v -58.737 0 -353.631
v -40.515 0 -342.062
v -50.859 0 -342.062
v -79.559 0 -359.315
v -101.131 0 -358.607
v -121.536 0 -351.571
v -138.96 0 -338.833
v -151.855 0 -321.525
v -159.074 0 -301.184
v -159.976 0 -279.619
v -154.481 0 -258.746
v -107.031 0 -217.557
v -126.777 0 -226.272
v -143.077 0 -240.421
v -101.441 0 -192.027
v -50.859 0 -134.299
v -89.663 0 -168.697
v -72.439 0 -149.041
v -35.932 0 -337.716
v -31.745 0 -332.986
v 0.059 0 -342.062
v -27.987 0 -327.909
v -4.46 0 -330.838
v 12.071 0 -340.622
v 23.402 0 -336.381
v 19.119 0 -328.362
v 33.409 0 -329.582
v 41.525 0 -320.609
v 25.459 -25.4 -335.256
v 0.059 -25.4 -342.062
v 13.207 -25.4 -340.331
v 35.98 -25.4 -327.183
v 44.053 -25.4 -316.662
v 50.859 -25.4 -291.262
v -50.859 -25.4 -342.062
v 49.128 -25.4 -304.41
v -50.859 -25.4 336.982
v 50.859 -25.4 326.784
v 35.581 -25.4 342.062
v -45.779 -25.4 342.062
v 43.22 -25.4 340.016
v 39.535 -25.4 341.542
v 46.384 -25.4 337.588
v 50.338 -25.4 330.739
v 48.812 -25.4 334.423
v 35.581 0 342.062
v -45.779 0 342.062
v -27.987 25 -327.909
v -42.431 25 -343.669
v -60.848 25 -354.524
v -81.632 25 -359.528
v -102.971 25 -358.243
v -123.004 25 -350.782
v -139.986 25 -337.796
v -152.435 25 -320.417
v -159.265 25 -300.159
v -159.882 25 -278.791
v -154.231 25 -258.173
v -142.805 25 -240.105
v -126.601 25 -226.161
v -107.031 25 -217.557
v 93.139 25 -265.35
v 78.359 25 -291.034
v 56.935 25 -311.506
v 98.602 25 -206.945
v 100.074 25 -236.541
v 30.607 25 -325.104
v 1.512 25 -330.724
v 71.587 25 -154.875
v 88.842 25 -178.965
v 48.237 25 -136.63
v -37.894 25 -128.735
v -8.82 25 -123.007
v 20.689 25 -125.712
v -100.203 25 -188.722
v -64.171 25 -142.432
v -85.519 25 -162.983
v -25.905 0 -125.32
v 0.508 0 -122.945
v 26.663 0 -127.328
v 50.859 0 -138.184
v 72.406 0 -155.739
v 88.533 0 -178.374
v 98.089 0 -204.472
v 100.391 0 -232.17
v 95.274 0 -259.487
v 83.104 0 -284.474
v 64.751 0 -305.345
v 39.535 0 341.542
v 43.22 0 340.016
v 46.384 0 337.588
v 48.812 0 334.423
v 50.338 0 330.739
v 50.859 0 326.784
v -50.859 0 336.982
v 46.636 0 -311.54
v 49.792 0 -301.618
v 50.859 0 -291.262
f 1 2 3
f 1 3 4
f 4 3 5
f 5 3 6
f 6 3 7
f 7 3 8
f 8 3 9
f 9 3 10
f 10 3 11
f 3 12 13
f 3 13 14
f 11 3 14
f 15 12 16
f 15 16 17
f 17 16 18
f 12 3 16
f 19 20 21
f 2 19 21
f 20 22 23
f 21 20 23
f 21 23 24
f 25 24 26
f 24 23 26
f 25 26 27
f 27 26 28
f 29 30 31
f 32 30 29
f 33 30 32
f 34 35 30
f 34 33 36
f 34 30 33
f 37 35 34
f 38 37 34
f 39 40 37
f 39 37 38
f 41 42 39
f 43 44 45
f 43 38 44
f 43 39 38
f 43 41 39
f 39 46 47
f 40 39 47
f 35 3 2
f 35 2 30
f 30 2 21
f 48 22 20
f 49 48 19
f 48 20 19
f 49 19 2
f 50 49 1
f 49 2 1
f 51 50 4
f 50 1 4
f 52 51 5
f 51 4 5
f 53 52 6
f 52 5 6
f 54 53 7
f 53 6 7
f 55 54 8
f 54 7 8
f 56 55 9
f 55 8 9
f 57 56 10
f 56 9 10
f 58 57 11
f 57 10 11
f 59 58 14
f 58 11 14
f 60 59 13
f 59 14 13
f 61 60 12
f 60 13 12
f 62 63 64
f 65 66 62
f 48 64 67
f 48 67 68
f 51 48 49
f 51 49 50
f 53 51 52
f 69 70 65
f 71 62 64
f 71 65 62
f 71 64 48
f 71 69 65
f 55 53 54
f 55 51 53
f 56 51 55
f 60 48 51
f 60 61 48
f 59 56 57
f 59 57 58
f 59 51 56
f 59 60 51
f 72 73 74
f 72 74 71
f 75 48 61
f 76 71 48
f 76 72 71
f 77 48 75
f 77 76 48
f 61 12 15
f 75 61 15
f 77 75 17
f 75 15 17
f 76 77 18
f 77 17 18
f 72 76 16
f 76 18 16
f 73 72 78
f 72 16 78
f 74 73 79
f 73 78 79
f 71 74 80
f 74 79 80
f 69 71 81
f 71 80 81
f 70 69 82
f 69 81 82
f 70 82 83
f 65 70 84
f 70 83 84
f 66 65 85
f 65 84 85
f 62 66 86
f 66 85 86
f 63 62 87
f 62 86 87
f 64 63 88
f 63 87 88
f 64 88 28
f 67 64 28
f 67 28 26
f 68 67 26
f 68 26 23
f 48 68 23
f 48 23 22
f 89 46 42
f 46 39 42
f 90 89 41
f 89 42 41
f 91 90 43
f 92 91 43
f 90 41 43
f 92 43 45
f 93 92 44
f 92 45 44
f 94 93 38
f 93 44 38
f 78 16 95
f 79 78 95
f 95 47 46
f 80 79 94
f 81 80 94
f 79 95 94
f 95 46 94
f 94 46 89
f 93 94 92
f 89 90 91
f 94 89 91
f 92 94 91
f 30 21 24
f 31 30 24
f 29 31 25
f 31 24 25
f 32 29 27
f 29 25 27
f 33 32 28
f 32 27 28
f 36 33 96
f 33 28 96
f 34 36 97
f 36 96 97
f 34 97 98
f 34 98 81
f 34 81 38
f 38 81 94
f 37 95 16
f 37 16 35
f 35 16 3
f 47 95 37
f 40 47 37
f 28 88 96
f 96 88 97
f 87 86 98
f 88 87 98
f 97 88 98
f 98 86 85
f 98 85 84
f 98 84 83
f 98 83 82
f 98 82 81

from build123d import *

# Parameters (mm, degrees)
F1_DEPTH = 25.4
F2_SIZE  = 5.08
F3_R     = 15.2778949267
F5_DEPTH = 25


with BuildPart() as f1:
    # F0 (on Front) → F1 (new body)
    with BuildSketch(Plane.XZ):
        with BuildLine():
            Line((50.8587062359, 342.0623540878), (-50.8587062359, 342.0623540878))
            Line((-50.8587062359, 342.0623540878), (-50.8587062359, -342.0623540878))
            Line((-50.8587062359, -342.0623540878), (0.0587062359, -342.0623540878))
            ThreePointArc((0.0587062359, -342.0623540878), (35.9797307202, -327.1833785721), (50.8587062359, -291.2623540878))
            Line((50.8587062359, -291.2623540878), (50.8587062359, 342.0623540878))
        make_face()
    extrude(amount=F1_DEPTH)

    # F2
    f2_edges = [f1.edges().sort_by_distance(p)[0] for p in [
        (-50.858706, -12.7, 342.062354),
    ]]
    chamfer(f2_edges, length=F2_SIZE)

    # F3
    f3_edges = [f1.edges().sort_by_distance(p)[0] for p in [
        (50.858706, -12.7, 342.062354),
    ]]
    fillet(f3_edges, radius=F3_R)

    # F4 (on face) → F5 (join)
    with BuildSketch(Plane(origin=(0, 0, 0), x_dir=(-1, 0, 0), z_dir=(0, 1, 0))):
        with BuildLine():
            ThreePointArc((27.986776288, -327.9091639399), (109.1739171381, -356.6419759562), (160.3966848346, -287.4093651772))
            ThreePointArc((160.3966848346, -287.4093651772), (145.5285553941, -243.4570500067), (107.0309394681, -217.5572266497))
            ThreePointArc((107.0309394681, -217.5572266497), (107.3433284277, -222.2019166399), (107.4475276889, -226.8559336662))
            ThreePointArc((107.4475276889, -226.8559336662), (85.2031326925, -291.1322247111), (27.986776288, -327.9091639399))
        make_face()
        with BuildLine():
            ThreePointArc((107.4475276889, -226.8559336662), (107.3433284277, -222.2019166399), (107.0309394681, -217.5572266497))
            ThreePointArc((107.0309394681, -217.5572266497), (29.1405817858, -245.2503223082), (27.986776288, -327.9091639399))
            ThreePointArc((27.986776288, -327.9091639399), (85.2031326925, -291.1322247111), (107.4475276889, -226.8559336662))
        make_face()
        with BuildLine():
            ThreePointArc((27.986776288, -327.9091639399), (29.1405817858, -245.2503223082), (107.0309394681, -217.5572266497))
            ThreePointArc((107.0309394681, -217.5572266497), (-81.0768529773, -166.3025021553), (27.986776288, -327.9091639399))
        make_face()
    extrude(amount=F5_DEPTH)


solid = f1.part
